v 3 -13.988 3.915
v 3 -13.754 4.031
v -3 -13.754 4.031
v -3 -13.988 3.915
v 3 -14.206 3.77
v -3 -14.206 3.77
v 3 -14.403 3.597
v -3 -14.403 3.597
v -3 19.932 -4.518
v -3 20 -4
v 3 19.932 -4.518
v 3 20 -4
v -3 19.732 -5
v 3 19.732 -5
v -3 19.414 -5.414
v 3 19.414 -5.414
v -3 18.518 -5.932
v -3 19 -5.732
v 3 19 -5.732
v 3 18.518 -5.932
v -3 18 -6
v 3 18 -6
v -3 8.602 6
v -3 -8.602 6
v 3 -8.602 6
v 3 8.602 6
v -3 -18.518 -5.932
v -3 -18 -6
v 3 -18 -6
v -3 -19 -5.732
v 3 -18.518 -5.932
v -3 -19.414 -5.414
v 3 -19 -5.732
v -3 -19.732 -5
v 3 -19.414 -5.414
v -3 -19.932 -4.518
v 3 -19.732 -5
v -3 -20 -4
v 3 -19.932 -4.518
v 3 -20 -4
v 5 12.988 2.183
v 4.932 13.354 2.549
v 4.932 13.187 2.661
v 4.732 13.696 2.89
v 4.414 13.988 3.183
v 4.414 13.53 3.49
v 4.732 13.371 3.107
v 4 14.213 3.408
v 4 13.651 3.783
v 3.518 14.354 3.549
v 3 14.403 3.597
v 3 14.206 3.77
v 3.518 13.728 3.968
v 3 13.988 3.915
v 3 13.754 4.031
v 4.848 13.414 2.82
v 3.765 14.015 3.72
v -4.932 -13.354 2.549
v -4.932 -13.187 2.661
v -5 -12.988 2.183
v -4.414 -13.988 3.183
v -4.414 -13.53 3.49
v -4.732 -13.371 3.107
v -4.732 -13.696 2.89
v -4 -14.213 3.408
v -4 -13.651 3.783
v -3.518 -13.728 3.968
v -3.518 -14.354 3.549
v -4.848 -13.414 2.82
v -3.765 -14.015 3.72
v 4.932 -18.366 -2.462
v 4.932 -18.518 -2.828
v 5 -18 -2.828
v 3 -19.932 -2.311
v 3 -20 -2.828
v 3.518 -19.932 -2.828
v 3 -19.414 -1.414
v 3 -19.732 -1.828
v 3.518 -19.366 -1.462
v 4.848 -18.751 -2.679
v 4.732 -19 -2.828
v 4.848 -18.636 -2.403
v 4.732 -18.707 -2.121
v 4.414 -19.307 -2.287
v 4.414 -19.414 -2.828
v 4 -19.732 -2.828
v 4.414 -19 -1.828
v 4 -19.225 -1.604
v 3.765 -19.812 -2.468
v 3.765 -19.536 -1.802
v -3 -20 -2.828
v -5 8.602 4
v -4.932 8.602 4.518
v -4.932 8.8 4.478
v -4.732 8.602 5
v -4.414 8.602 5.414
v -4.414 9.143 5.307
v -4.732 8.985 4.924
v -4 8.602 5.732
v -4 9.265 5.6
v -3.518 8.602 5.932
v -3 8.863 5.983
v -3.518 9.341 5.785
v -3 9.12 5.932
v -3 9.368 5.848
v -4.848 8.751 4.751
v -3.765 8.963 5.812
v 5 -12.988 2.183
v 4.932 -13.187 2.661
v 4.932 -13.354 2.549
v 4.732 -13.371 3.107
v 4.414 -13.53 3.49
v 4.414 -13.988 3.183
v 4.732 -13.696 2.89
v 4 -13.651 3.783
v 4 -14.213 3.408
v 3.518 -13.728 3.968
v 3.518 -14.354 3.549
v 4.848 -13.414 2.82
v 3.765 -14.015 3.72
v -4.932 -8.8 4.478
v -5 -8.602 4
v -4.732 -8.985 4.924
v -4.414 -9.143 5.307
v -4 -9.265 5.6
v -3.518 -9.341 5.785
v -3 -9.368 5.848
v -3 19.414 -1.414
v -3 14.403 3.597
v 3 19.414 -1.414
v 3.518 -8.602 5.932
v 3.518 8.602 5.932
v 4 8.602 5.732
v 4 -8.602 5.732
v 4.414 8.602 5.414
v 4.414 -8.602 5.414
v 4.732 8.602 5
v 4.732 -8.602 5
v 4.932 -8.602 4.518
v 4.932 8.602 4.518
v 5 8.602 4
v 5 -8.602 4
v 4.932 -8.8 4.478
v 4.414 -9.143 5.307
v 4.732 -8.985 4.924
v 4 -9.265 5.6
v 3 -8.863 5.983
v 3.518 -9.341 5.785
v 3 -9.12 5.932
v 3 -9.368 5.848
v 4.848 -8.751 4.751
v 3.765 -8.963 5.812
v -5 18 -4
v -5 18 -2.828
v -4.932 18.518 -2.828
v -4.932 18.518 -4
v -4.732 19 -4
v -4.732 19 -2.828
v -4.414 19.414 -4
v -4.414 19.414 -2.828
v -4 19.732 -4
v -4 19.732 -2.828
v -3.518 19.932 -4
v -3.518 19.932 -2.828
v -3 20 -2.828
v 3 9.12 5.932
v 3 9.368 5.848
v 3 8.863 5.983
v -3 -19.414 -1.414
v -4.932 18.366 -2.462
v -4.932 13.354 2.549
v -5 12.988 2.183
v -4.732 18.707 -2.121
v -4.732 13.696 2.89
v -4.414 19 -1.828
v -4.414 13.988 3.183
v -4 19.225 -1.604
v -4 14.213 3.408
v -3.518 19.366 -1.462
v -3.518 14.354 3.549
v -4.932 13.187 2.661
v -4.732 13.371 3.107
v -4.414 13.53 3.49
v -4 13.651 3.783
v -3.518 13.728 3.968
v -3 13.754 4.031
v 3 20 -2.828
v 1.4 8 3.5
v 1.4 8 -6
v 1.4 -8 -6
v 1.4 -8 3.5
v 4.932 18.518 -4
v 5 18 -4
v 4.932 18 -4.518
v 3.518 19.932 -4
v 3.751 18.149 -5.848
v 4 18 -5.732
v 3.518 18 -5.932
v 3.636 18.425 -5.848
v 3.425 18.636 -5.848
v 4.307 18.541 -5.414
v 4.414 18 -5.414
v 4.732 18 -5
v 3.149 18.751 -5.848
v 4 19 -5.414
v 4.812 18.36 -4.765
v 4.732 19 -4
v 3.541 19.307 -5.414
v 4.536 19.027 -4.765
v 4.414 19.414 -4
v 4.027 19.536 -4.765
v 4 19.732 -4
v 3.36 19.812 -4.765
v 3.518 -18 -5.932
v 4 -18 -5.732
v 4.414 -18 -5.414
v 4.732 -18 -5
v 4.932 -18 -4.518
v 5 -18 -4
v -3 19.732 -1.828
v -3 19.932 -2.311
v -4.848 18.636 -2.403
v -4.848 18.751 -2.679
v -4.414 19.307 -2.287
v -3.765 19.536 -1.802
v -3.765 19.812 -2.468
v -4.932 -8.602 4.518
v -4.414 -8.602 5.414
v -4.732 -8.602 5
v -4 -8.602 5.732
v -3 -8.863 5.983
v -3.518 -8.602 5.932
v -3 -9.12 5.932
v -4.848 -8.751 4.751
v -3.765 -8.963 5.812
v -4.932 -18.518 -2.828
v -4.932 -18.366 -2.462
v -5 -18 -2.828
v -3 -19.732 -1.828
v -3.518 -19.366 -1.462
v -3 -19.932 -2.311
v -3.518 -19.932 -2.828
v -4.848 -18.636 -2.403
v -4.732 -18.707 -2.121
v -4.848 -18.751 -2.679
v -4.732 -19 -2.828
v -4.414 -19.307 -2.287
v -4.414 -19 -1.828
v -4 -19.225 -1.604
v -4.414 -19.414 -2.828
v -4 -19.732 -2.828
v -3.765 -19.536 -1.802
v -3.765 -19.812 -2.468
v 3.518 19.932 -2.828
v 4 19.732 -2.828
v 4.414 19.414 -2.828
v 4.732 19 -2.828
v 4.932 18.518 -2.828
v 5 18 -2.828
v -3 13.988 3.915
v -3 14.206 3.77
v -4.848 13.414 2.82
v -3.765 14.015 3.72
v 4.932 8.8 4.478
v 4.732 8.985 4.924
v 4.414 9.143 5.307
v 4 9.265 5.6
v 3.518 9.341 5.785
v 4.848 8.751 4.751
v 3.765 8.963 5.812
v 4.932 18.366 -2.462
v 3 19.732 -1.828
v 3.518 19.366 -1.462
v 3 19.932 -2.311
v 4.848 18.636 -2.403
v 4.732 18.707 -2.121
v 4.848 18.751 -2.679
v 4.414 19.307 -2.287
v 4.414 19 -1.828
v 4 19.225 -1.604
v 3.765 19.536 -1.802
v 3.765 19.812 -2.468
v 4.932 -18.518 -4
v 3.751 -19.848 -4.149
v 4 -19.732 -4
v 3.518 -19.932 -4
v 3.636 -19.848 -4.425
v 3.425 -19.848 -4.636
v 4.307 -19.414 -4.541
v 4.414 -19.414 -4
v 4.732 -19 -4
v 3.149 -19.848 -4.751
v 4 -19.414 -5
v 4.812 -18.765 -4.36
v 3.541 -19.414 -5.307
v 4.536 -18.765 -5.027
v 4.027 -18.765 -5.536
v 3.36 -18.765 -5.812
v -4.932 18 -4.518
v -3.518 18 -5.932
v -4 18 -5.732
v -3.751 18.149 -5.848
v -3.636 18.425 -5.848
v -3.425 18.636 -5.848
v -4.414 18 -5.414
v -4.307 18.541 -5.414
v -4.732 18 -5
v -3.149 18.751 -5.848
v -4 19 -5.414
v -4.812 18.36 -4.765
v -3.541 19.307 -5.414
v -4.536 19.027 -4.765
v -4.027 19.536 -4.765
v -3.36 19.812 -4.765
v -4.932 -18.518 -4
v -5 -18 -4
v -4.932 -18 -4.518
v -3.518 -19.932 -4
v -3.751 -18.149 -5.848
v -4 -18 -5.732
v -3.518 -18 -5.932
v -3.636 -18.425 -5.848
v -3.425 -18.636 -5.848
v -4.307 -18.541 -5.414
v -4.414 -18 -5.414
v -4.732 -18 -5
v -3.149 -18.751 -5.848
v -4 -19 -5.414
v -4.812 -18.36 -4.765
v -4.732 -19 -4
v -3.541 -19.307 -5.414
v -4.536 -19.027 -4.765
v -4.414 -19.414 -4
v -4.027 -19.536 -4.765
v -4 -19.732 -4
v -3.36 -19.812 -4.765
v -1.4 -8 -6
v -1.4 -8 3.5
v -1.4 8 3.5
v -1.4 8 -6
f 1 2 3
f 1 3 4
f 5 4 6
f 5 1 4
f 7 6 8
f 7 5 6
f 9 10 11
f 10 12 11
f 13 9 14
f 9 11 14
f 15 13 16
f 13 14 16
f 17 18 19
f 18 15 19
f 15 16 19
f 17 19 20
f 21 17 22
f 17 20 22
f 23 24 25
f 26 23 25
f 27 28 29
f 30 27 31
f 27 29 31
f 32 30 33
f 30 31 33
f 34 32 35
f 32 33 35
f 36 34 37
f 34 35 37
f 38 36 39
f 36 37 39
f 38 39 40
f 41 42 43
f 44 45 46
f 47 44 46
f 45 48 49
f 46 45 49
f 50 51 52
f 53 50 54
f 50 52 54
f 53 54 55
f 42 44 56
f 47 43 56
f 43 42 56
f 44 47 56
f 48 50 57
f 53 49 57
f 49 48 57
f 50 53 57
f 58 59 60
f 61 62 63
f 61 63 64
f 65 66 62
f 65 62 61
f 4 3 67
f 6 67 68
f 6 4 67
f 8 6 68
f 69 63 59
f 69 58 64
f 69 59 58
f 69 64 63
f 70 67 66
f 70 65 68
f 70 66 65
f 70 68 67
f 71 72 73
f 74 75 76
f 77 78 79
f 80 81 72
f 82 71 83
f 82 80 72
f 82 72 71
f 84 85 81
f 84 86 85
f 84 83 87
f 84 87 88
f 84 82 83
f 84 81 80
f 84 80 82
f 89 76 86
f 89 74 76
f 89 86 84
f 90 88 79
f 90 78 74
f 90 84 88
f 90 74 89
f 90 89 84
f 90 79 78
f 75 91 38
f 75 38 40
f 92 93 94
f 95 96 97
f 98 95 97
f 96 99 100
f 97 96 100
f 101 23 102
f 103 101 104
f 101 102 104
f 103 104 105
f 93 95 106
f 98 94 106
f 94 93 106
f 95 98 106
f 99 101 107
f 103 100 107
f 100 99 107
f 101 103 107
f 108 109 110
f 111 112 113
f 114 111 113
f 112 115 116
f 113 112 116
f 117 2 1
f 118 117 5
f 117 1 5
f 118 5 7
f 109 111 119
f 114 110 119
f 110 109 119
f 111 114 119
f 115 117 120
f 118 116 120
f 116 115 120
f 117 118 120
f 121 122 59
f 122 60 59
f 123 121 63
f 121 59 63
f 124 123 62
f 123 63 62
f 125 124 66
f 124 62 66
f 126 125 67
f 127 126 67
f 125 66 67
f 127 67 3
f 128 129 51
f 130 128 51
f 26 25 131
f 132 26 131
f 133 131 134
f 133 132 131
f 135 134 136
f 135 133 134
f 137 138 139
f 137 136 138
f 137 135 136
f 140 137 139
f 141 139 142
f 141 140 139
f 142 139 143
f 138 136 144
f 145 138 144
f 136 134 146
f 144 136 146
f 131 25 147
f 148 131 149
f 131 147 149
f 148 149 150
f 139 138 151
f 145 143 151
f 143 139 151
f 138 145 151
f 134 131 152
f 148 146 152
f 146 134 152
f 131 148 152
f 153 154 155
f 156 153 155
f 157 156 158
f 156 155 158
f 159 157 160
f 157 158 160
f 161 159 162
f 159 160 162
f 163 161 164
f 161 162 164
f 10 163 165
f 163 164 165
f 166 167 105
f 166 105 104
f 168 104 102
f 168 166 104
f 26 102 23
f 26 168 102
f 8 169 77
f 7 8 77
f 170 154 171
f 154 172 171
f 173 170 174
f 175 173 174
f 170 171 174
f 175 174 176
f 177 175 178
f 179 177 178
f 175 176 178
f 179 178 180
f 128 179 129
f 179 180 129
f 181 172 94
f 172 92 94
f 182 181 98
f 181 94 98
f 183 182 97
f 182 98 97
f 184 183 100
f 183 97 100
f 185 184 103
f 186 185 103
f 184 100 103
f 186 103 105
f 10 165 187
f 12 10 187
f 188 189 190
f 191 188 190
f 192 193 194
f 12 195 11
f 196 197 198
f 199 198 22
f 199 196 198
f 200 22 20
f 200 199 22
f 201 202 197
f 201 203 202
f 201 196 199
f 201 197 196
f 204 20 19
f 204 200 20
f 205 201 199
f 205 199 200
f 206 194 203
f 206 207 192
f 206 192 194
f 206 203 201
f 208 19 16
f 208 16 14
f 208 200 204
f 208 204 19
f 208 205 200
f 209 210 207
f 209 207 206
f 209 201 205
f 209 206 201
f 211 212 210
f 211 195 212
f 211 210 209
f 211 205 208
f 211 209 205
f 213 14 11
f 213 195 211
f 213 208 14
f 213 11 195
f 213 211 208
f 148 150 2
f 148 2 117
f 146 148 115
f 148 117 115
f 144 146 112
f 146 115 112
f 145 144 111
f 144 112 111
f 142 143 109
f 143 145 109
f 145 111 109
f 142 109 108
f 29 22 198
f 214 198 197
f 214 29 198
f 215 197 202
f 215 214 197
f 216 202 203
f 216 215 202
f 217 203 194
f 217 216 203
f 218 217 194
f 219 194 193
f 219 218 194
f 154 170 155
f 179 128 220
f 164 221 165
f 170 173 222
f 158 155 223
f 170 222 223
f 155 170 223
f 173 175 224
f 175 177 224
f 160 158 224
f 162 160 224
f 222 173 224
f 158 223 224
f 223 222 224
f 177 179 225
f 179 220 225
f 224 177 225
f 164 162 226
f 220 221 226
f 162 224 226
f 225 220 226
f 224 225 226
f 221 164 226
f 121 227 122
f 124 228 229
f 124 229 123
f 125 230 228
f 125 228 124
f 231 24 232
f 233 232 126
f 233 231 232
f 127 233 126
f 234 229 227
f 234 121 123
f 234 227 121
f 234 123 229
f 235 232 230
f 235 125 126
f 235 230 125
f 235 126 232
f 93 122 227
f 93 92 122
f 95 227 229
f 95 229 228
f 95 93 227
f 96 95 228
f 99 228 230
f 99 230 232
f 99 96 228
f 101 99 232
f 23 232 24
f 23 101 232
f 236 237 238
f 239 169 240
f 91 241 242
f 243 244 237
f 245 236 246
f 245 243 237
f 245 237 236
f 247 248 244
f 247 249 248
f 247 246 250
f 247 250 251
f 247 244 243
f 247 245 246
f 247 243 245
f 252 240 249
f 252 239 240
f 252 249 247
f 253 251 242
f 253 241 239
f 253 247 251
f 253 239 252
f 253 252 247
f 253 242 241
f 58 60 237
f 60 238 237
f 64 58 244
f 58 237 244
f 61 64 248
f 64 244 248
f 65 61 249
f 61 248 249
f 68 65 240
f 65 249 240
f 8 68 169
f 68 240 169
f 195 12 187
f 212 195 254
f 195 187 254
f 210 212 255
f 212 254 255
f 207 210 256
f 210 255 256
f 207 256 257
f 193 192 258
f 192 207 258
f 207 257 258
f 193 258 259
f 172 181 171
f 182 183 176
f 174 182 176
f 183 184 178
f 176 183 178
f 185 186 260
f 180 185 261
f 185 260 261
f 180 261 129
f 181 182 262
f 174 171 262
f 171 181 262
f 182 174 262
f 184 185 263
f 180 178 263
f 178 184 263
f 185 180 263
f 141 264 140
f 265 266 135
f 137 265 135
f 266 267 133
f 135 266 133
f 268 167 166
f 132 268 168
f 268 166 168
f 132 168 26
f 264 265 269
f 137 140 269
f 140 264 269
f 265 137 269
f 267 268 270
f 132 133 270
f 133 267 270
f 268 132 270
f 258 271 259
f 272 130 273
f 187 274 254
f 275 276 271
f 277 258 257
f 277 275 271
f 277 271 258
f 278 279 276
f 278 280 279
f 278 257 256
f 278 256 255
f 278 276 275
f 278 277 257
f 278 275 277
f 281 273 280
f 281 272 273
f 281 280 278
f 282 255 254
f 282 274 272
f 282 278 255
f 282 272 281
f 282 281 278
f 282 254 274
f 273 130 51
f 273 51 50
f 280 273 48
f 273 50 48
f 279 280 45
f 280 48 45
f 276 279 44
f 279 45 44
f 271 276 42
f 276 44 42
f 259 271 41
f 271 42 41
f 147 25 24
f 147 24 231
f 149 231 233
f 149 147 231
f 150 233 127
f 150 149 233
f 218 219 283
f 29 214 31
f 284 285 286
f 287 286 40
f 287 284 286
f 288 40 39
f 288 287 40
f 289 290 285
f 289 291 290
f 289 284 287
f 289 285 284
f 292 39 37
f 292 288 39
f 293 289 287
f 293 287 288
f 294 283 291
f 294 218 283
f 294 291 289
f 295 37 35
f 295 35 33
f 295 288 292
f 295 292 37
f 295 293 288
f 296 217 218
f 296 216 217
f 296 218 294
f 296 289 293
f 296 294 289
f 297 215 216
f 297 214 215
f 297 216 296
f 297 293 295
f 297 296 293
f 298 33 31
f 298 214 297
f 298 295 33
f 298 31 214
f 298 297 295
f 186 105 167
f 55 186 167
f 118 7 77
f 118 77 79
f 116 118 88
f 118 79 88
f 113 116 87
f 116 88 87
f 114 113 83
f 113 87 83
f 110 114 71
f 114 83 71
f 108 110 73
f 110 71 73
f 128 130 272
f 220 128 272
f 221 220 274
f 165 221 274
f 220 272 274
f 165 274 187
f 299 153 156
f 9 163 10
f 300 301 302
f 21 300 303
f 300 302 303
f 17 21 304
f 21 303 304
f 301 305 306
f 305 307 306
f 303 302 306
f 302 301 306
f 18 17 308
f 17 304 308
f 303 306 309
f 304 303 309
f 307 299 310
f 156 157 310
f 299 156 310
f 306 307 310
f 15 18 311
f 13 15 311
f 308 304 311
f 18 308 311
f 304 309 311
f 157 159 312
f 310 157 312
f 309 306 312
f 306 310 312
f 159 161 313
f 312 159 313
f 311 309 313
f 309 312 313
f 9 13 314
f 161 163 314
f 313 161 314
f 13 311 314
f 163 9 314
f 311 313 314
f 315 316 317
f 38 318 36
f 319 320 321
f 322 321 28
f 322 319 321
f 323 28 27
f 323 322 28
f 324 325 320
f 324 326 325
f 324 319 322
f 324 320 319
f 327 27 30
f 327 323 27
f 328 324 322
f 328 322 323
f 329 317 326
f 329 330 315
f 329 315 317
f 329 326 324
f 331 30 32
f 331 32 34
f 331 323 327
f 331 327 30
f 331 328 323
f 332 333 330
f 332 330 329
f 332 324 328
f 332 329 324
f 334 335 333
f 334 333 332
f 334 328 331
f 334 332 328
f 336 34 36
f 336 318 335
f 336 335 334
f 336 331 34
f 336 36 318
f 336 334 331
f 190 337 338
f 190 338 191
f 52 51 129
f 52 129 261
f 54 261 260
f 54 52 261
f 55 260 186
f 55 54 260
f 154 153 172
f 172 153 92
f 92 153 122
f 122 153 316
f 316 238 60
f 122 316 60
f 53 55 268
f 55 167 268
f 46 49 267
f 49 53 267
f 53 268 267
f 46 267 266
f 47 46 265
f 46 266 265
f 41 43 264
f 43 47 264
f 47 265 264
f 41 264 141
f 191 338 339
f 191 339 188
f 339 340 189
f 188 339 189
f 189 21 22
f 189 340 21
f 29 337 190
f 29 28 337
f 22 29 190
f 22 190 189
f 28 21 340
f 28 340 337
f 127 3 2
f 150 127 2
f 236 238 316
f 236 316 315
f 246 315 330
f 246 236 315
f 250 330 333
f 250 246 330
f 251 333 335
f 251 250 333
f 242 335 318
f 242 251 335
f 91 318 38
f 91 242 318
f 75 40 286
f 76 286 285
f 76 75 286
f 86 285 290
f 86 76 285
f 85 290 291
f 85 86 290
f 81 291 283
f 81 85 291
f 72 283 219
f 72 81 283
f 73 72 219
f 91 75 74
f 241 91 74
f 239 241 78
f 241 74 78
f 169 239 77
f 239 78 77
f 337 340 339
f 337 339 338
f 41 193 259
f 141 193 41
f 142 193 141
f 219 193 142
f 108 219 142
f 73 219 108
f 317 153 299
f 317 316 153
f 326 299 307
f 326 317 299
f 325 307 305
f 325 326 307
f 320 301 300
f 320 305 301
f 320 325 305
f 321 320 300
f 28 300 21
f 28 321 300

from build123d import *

# Parameters (mm, degrees)
F0_W     = 10
F0_H     = 12
F1_DEPTH = 20
F2_W     = 2.8
F2_H     = 16
F3_DEPTH = 9.5
F4_SIZE  = 8
F5_SIZE  = 3
F6_R     = 2


with BuildPart() as f1:
    # F0 (on Front) → F1 (new body, symmetric)
    with BuildSketch(Plane.XZ):
        Rectangle(F0_W, F0_H)
    extrude(amount=F1_DEPTH, both=True)

    # F2 (on face) → F3 (cut)
    with BuildSketch(Plane(origin=(0, 0, -6), x_dir=(1, 0, 0), z_dir=(0, 0, -1))):
        Rectangle(F2_W, F2_H)
    extrude(amount=-F3_DEPTH, mode=Mode.SUBTRACT)

    # F4
    f4_edges = [f1.edges().sort_by_distance(p)[0] for p in [
        (0, -20, 6),
        (0, 20, 6),
    ]]
    chamfer(f4_edges, length=F4_SIZE)

    # F5
    f5_edges = [f1.edges().sort_by_distance(p)[0] for p in [
        (0, -12, 6),
        (0, 12, 6),
    ]]
    chamfer(f5_edges, length=F5_SIZE)

    # F6
    f6_edges = [f1.edges().sort_by_distance(p)[0] for p in [
        (5, 17.06066, 0.93934),
        (5, 11.56066, 4.93934),
        (5, 20, -4),
        (5, 0, 6),
        (5, 0, -6),
        (5, -11.56066, 4.93934),
        (5, -20, -4),
        (5, -17.06066, 0.93934),
        (-5, 0, 6),
        (-5, 11.56066, 4.93934),
        (-5, -11.56066, 4.93934),
        (-5, 17.06066, 0.93934),
        (-5, -17.06066, 0.93934),
        (-5, 20, -4),
        (-5, -20, -4),
        (-5, 0, -6),
        (0, -20, -6),
        (0, 20, -6),
        (0, 20, -2),
        (0, 14.12132, 3.87868),
        (0, 9, 6),
        (0, -9, 6),
        (0, -14.12132, 3.87868),
        (0, -20, -2),
    ]]
    fillet(f6_edges, radius=F6_R)


solid = f1.part
